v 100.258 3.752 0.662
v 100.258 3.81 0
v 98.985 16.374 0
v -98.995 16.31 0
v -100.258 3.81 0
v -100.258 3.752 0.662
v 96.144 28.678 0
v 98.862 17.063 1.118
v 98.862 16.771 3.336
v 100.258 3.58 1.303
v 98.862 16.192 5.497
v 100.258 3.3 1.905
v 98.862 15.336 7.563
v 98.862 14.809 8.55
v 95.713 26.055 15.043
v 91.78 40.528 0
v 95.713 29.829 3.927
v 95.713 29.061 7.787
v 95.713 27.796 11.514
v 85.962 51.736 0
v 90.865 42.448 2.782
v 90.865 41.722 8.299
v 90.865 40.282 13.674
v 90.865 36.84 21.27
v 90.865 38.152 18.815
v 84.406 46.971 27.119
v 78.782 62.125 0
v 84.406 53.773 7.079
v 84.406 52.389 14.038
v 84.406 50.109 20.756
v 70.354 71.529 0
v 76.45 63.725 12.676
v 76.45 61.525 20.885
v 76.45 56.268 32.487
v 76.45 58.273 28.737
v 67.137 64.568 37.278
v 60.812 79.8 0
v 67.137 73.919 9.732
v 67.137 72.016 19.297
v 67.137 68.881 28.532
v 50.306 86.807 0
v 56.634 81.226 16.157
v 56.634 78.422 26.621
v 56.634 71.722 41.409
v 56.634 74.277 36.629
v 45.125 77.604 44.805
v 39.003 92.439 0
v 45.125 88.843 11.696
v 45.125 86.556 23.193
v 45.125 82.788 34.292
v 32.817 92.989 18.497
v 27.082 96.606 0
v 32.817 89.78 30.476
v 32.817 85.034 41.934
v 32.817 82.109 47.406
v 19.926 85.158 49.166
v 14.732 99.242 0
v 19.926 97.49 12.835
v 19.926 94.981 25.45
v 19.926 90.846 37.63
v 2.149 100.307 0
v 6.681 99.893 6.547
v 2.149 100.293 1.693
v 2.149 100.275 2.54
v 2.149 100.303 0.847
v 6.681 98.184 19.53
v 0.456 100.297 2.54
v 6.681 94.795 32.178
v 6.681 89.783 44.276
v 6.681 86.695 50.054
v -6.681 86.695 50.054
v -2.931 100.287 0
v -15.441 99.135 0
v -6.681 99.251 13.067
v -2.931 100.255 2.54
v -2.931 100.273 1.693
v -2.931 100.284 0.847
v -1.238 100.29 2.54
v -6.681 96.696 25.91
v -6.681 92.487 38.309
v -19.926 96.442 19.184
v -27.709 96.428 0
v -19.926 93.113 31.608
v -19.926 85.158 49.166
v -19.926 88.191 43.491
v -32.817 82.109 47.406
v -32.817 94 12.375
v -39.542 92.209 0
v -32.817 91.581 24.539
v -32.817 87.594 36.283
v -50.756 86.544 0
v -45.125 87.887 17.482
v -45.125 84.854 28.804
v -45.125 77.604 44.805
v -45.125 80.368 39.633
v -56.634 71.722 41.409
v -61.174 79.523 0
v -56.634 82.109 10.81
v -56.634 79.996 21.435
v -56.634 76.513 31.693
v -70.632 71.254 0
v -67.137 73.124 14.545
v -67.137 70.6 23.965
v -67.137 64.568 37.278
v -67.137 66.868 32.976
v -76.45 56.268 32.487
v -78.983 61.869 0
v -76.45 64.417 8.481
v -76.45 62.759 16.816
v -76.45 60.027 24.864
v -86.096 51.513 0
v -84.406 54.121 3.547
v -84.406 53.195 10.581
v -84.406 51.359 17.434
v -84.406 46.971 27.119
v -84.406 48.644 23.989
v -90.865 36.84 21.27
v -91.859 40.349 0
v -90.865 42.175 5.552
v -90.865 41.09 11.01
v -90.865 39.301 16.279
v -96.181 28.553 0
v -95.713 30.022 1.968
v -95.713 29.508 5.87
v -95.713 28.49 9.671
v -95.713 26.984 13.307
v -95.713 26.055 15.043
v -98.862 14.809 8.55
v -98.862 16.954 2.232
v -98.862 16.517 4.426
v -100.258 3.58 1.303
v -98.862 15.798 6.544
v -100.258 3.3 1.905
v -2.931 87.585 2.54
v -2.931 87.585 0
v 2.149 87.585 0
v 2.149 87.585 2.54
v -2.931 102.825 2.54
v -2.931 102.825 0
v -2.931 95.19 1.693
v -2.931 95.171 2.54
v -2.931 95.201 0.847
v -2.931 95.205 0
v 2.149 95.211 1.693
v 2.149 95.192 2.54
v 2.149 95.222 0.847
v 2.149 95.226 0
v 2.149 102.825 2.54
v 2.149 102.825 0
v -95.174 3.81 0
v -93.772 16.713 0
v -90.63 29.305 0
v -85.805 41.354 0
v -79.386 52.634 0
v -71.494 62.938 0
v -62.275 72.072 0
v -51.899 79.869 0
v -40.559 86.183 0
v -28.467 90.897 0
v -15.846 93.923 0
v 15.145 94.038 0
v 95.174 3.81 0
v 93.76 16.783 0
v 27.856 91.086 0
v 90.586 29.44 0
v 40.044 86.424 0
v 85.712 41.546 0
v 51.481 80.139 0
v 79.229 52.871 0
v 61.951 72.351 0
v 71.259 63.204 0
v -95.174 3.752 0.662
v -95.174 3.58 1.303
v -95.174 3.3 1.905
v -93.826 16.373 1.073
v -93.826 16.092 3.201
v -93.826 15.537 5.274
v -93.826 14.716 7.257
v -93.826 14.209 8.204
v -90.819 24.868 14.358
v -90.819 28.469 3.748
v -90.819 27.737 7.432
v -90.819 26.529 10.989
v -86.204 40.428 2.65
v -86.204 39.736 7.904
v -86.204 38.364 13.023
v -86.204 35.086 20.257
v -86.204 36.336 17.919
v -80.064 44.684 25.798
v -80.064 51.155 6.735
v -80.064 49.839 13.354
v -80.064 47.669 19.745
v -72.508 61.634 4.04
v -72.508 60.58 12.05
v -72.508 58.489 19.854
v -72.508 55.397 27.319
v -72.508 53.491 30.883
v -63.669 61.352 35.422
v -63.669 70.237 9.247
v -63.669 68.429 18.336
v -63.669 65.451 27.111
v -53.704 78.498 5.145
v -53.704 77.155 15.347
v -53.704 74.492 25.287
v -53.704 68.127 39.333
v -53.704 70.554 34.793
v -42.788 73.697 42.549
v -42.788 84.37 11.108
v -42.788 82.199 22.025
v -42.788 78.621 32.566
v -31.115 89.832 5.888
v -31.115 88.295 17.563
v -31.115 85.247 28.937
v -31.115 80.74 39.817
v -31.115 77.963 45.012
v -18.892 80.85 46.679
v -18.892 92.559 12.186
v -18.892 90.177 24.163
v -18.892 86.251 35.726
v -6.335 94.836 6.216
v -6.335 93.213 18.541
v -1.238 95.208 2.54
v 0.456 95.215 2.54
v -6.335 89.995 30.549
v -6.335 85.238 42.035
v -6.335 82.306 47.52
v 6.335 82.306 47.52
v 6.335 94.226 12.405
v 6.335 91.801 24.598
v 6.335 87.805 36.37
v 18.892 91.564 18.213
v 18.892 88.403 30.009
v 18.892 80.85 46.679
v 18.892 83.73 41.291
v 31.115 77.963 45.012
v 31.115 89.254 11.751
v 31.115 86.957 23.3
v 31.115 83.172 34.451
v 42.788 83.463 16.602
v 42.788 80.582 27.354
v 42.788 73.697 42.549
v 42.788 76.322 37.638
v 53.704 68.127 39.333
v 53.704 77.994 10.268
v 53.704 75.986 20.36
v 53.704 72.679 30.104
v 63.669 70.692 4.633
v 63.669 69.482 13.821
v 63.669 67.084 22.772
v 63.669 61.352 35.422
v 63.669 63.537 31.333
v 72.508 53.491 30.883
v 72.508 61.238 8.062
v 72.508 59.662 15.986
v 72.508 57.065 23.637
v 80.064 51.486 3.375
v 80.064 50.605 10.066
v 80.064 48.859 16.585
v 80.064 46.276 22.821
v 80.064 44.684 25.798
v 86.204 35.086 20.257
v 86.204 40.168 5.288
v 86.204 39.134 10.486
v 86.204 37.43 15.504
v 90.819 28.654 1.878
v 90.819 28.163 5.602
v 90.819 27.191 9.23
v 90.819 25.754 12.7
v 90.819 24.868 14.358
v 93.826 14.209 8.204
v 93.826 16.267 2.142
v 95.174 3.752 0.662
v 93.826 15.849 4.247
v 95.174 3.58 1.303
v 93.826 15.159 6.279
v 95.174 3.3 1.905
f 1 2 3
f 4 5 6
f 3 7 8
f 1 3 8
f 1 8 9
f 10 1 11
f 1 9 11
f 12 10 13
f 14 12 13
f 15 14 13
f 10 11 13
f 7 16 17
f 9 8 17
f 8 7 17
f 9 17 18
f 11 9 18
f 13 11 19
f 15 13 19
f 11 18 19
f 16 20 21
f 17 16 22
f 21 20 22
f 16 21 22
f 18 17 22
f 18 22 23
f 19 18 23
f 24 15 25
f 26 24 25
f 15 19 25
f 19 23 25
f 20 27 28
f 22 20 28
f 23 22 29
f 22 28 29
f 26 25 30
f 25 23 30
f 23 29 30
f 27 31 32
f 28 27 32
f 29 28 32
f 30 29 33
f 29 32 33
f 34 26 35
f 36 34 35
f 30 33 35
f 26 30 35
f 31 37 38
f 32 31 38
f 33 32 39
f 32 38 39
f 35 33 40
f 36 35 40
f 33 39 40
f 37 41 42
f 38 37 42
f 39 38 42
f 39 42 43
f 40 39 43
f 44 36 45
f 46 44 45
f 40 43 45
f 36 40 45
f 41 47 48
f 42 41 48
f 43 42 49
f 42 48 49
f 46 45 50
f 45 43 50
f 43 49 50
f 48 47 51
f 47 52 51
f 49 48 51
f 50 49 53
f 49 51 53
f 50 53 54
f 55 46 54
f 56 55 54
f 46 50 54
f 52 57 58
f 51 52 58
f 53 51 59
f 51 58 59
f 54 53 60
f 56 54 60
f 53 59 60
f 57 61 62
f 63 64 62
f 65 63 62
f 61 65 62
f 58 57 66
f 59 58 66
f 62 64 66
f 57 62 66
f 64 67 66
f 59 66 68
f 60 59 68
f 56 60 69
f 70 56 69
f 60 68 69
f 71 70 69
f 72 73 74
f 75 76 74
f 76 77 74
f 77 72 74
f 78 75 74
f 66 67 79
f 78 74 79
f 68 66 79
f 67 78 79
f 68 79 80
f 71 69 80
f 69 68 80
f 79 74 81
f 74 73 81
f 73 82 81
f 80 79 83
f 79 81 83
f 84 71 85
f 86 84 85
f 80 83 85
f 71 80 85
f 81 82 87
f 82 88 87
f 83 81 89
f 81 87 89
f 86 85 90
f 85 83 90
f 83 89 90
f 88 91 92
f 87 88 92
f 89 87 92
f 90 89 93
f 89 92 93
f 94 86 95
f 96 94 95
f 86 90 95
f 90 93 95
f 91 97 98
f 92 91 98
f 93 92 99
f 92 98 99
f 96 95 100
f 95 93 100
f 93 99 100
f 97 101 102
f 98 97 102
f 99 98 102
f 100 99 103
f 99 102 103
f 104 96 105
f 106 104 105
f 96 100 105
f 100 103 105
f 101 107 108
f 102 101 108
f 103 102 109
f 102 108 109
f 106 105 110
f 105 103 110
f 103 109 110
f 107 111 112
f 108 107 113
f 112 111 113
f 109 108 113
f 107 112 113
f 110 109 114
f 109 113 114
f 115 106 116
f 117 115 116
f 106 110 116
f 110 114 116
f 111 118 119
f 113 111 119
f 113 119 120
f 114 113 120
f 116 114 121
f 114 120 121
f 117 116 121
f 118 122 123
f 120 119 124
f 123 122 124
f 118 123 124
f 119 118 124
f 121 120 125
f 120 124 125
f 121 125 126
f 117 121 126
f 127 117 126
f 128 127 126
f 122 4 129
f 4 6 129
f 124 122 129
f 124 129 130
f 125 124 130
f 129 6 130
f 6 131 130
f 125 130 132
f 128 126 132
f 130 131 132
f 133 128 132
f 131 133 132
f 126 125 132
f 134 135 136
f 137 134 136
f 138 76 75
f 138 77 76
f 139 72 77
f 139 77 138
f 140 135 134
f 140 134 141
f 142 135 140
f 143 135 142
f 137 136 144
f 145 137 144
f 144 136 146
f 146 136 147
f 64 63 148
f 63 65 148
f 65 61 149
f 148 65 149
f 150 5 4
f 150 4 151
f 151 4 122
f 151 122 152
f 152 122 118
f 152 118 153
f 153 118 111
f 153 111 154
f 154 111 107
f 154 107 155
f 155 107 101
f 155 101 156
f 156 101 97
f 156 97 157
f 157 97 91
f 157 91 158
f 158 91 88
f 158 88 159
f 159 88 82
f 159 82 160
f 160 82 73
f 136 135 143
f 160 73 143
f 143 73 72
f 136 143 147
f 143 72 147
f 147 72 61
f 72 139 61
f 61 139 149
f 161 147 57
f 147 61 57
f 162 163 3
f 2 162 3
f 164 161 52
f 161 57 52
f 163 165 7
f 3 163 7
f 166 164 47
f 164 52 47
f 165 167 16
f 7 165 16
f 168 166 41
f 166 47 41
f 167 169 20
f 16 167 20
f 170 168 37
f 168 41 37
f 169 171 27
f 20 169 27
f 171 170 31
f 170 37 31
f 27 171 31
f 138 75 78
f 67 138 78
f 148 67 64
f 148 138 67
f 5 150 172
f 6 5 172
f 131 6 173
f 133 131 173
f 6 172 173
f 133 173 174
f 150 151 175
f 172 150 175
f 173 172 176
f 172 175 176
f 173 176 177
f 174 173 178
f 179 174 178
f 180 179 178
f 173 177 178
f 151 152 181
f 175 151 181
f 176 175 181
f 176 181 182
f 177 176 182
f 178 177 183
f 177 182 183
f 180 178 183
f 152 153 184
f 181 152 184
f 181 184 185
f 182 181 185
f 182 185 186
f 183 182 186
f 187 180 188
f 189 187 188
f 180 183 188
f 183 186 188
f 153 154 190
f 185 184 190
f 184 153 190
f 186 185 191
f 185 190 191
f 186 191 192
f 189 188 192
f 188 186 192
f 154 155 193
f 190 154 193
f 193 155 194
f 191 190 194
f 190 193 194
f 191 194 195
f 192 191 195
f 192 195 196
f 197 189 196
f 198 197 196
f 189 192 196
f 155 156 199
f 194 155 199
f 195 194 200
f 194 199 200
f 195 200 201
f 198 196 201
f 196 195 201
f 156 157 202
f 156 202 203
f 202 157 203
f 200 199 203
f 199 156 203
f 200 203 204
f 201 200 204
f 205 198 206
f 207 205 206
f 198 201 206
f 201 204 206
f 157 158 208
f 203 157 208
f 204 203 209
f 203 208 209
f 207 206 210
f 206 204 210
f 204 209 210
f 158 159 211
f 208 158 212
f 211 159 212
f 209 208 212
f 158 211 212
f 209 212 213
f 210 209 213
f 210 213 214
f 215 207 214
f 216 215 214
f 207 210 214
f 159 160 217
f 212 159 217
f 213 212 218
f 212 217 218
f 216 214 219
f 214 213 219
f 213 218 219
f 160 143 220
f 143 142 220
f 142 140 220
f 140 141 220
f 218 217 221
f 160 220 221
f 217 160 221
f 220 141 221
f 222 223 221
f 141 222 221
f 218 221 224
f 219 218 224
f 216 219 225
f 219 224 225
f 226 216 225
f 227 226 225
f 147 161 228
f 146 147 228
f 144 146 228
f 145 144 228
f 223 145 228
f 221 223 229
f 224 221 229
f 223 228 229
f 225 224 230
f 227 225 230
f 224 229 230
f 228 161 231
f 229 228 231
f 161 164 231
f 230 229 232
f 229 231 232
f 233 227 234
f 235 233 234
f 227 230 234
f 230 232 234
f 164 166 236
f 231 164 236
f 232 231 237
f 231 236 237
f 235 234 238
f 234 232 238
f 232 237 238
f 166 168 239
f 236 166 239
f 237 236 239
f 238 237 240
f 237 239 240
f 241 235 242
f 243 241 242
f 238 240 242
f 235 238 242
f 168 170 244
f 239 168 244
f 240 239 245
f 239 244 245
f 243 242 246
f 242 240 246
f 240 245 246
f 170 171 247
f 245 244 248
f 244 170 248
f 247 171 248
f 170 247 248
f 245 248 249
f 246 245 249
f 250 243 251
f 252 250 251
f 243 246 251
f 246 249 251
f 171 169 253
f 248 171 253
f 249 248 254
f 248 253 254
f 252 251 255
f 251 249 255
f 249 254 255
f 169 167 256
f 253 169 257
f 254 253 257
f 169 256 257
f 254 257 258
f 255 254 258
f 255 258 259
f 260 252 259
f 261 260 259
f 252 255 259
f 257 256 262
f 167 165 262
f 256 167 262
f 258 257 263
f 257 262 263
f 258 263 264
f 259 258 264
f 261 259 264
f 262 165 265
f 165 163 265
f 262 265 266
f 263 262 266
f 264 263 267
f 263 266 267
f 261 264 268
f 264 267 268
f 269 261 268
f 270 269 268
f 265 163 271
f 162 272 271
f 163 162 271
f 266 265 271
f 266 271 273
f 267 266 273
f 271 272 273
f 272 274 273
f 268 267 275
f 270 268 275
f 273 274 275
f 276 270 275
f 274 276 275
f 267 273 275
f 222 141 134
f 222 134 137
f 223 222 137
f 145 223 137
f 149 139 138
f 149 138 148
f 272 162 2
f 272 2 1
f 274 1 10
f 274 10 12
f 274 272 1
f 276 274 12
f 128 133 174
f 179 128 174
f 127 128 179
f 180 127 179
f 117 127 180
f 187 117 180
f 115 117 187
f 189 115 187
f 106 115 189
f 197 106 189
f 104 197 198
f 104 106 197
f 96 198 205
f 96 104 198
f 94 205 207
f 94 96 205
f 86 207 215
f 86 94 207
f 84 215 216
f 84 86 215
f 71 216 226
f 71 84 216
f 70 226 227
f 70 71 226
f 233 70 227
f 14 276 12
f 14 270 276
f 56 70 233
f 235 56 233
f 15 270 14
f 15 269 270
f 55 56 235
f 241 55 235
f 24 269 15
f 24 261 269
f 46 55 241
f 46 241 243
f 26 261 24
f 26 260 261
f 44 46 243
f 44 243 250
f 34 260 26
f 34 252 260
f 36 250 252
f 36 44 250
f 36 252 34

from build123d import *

# Parameters (mm, degrees)
F1_ANGLE      = 30
F2_R          = 3.81
F3_DEPTH      = 100.331
F3_DEPTH_BACK = 100.331
F4_W          = 5.08
F4_H          = 15.24
F5_DEPTH      = 2.54


with BuildPart() as f1:
    # F0 (on Top) → F1 (revolve)
    with BuildSketch(Plane.XY):
        with BuildLine():
            Line((-100.33, 0), (-95.25, 0))
            ThreePointArc((-95.25, 0), (0, 95.25), (95.25, 0))
            Line((95.25, 0), (100.33, 0))
            ThreePointArc((100.33, 0), (0, 100.33), (-100.33, 0))
        make_face()
    revolve(axis=Axis((-47.625, 0, 0), (1, 0, 0)), revolution_arc=F1_ANGLE)

    # F2 (on Right) → F3 (cut, two sides)
    with BuildSketch(Plane.YZ) as f3_sk:
        Circle(F2_R)
    extrude(amount=-F3_DEPTH, mode=Mode.SUBTRACT)
    extrude(f3_sk.sketch, amount=F3_DEPTH_BACK, mode=Mode.SUBTRACT)

    # F4 (on Top) → F5 (join)
    with BuildSketch(Plane.XY):
        with Locations((-0.3907692308, 95.2049005657)):
            Rectangle(F4_W, F4_H)
    extrude(amount=F5_DEPTH)


solid = f1.part
